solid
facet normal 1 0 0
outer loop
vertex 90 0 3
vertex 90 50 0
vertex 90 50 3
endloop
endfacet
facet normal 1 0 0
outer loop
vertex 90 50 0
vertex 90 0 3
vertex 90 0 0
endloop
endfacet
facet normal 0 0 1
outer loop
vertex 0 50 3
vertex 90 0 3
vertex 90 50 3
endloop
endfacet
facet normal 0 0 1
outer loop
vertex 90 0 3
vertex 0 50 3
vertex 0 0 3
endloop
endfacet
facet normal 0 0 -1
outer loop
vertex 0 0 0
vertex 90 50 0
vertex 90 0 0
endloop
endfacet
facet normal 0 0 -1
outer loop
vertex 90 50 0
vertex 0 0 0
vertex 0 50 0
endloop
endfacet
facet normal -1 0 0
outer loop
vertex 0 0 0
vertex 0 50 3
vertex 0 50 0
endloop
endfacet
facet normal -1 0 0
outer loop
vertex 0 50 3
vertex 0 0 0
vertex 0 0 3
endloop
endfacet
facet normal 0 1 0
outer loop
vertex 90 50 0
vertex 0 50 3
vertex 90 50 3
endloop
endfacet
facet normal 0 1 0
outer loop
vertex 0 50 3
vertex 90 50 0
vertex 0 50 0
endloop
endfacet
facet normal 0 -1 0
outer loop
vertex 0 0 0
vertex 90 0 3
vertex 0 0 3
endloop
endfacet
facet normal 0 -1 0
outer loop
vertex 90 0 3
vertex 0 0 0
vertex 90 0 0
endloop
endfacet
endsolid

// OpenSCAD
/*
Flat image relief in native OpenSCAD.

OpenSCAD surface() maps image gray values to nominal Z values 0..100.
Set the exact raster dimensions below; preserve aspect ratio deliberately.
For curved objects, generate a watertight patch with relief_patch.py and use
templates/openscad/imported_patch_boolean.scad instead.
*/
image_file = "heightmap.png";
image_width_px = 512;
image_height_px = 256;
physical_width_mm = 80;
physical_height_mm = 40;
relief_depth_mm = 0.8;
overlap_mm = 0.08;
invert_image = false;
operation = "engrave"; // "emboss" or "engrave"

base_width_mm = 90;
base_height_mm = 50;
base_thickness_mm = 3;

module native_height_solid(extra_depth = 0) {
    scale([
        physical_width_mm / max(1, image_width_px),
        physical_height_mm / max(1, image_height_px),
        (relief_depth_mm + extra_depth) / 100
    ])
        surface(file=image_file, center=false, invert=invert_image, convexity=20);
}

module base() {
    cube([base_width_mm, base_height_mm, base_thickness_mm]);
}

x0 = (base_width_mm - physical_width_mm) / 2;
y0 = (base_height_mm - physical_height_mm) / 2;

if (operation == "emboss") {
    union() {
        base();
        translate([x0, y0, base_thickness_mm - overlap_mm])
            native_height_solid(overlap_mm);
    }
} else {
    difference() {
        base();
        // Mirror so bright pixels extend down into the body.
        translate([x0, y0, base_thickness_mm + overlap_mm])
            mirror([0, 0, 1])
                native_height_solid(overlap_mm);
    }
}
